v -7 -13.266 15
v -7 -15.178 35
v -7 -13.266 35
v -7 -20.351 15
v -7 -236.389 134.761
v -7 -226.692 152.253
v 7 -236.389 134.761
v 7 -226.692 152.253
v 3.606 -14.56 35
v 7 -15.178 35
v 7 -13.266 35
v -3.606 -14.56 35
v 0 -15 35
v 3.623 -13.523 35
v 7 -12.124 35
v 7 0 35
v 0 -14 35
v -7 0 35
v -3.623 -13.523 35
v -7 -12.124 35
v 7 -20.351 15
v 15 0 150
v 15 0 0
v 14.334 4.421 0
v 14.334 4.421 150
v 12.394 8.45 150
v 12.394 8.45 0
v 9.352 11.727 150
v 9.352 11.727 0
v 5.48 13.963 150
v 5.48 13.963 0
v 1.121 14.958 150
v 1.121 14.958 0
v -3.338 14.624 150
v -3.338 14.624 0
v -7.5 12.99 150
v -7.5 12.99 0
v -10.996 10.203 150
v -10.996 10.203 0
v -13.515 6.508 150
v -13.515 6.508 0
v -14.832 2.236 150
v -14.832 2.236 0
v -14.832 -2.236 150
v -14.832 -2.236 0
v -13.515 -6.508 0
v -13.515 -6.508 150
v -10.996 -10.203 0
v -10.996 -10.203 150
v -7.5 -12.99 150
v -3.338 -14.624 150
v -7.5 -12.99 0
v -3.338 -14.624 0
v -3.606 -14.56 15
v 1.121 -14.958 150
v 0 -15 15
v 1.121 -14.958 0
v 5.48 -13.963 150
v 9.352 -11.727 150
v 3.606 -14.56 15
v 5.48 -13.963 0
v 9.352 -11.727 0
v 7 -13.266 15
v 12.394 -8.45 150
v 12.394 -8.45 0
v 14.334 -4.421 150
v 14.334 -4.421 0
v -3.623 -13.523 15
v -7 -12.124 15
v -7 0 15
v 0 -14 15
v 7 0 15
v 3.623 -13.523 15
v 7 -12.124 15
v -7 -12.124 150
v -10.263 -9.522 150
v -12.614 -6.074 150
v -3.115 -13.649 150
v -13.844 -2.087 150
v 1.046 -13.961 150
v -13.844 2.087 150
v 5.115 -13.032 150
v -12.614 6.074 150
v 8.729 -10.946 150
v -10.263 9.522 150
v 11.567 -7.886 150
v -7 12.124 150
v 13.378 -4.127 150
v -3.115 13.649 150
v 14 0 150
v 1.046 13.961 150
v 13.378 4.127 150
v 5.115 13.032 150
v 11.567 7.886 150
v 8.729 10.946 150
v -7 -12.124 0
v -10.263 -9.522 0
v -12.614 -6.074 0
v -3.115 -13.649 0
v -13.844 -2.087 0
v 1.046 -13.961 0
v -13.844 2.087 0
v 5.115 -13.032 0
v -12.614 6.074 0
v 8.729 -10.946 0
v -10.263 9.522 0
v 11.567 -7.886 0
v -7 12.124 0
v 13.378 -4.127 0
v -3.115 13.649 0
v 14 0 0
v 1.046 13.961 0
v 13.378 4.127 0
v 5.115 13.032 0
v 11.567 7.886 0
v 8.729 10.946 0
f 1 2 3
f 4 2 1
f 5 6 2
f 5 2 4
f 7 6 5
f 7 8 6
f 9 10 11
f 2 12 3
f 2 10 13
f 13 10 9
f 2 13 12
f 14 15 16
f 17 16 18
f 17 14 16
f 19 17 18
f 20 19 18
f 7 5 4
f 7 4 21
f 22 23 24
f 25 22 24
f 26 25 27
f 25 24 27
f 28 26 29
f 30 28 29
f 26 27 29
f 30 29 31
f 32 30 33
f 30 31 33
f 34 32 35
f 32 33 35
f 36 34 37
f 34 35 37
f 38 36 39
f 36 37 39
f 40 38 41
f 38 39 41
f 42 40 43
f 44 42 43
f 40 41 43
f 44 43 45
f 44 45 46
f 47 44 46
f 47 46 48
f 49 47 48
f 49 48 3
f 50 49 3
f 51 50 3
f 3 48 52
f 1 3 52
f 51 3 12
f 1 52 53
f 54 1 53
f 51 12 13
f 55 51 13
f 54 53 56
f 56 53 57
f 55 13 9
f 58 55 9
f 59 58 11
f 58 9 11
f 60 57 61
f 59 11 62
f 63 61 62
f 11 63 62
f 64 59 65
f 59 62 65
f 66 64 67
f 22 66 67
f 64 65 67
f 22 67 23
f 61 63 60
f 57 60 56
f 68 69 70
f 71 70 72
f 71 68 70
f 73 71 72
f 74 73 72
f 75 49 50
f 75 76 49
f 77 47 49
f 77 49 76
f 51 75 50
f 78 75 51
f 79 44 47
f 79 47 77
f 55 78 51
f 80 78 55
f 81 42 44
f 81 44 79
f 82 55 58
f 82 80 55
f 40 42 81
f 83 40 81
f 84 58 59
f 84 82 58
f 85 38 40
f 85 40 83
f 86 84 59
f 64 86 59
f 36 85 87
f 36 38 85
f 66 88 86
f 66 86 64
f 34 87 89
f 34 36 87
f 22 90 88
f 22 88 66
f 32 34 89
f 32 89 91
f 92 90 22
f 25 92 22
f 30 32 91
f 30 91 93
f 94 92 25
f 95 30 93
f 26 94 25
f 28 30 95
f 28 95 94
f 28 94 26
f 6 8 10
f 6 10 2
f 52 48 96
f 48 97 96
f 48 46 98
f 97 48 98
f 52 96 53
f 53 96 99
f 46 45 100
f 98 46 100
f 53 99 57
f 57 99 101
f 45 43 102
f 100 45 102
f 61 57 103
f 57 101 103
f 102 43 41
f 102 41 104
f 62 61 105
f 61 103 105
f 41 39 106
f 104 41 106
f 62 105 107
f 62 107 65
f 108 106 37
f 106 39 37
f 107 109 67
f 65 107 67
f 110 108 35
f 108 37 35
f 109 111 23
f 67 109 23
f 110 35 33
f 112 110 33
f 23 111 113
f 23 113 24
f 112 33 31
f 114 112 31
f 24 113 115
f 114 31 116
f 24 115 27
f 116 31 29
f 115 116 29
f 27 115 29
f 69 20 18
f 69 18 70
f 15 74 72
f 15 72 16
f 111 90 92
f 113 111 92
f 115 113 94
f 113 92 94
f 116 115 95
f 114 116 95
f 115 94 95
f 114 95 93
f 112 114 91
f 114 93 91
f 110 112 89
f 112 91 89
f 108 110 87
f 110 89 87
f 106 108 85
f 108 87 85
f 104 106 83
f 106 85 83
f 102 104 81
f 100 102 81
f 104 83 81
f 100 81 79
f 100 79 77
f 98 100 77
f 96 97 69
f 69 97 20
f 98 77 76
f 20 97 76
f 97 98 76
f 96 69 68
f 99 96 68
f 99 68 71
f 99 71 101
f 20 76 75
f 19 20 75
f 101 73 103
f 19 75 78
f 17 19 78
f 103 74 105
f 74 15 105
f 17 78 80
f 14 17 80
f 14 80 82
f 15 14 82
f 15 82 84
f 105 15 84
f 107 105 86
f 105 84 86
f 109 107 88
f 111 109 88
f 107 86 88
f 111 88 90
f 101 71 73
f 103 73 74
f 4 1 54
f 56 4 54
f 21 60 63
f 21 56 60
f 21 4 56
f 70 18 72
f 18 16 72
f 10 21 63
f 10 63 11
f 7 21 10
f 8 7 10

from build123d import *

# Parameters (mm, degrees)
F0_R      = 15
F1_DEPTH  = 150
F2_R      = 14
F3_DEPTH  = 150
F4_W      = 14
F4_H      = 20
F9_W      = 7
F9_H      = 30
F10_DEPTH = 250


with BuildPart() as f1:
    # F0 (on Top) → F1 (new body)
    with BuildSketch(Plane.XY):
        Circle(F0_R)
    extrude(amount=F1_DEPTH)

    # F2 (on face) → F3 (cut, through all)
    with BuildSketch(Plane.XY.offset(150)):
        Circle(F2_R)
    extrude(amount=-F3_DEPTH, mode=Mode.SUBTRACT)

    # F6: sweep along a path in F5
    with BuildLine(Plane.YZ) as f6_path:
        Line((0, 35.6896594167), (-15, 35.6896594167))
        Line((-15, 35.6896594167), (-226.3578921556, 152.8566330671))
    # F4 (on Front) → F6 (sweep)
    with BuildSketch(Plane.XZ):
        with Locations((0, 25)):
            Rectangle(F4_W, F4_H)
    sweep(path=f6_path.line, transition=Transition.RIGHT)


with BuildPart() as f10:
    # F9 (on face) → F10 (new body)
    with BuildSketch(Plane(origin=(0, 0, 0), x_dir=(-1, 0, 0), z_dir=(0, 0.8660254038, 0.5))):
        with Locations((3.5, 36.4281994849)):
            Rectangle(F9_W, F9_H)
        with Locations((-3.5, 36.4281994849)):
            Rectangle(F9_W, F9_H)
    extrude(amount=F10_DEPTH)

    # F11: cut F1
    add(f1.part, mode=Mode.SUBTRACT)


solid = f1.part
